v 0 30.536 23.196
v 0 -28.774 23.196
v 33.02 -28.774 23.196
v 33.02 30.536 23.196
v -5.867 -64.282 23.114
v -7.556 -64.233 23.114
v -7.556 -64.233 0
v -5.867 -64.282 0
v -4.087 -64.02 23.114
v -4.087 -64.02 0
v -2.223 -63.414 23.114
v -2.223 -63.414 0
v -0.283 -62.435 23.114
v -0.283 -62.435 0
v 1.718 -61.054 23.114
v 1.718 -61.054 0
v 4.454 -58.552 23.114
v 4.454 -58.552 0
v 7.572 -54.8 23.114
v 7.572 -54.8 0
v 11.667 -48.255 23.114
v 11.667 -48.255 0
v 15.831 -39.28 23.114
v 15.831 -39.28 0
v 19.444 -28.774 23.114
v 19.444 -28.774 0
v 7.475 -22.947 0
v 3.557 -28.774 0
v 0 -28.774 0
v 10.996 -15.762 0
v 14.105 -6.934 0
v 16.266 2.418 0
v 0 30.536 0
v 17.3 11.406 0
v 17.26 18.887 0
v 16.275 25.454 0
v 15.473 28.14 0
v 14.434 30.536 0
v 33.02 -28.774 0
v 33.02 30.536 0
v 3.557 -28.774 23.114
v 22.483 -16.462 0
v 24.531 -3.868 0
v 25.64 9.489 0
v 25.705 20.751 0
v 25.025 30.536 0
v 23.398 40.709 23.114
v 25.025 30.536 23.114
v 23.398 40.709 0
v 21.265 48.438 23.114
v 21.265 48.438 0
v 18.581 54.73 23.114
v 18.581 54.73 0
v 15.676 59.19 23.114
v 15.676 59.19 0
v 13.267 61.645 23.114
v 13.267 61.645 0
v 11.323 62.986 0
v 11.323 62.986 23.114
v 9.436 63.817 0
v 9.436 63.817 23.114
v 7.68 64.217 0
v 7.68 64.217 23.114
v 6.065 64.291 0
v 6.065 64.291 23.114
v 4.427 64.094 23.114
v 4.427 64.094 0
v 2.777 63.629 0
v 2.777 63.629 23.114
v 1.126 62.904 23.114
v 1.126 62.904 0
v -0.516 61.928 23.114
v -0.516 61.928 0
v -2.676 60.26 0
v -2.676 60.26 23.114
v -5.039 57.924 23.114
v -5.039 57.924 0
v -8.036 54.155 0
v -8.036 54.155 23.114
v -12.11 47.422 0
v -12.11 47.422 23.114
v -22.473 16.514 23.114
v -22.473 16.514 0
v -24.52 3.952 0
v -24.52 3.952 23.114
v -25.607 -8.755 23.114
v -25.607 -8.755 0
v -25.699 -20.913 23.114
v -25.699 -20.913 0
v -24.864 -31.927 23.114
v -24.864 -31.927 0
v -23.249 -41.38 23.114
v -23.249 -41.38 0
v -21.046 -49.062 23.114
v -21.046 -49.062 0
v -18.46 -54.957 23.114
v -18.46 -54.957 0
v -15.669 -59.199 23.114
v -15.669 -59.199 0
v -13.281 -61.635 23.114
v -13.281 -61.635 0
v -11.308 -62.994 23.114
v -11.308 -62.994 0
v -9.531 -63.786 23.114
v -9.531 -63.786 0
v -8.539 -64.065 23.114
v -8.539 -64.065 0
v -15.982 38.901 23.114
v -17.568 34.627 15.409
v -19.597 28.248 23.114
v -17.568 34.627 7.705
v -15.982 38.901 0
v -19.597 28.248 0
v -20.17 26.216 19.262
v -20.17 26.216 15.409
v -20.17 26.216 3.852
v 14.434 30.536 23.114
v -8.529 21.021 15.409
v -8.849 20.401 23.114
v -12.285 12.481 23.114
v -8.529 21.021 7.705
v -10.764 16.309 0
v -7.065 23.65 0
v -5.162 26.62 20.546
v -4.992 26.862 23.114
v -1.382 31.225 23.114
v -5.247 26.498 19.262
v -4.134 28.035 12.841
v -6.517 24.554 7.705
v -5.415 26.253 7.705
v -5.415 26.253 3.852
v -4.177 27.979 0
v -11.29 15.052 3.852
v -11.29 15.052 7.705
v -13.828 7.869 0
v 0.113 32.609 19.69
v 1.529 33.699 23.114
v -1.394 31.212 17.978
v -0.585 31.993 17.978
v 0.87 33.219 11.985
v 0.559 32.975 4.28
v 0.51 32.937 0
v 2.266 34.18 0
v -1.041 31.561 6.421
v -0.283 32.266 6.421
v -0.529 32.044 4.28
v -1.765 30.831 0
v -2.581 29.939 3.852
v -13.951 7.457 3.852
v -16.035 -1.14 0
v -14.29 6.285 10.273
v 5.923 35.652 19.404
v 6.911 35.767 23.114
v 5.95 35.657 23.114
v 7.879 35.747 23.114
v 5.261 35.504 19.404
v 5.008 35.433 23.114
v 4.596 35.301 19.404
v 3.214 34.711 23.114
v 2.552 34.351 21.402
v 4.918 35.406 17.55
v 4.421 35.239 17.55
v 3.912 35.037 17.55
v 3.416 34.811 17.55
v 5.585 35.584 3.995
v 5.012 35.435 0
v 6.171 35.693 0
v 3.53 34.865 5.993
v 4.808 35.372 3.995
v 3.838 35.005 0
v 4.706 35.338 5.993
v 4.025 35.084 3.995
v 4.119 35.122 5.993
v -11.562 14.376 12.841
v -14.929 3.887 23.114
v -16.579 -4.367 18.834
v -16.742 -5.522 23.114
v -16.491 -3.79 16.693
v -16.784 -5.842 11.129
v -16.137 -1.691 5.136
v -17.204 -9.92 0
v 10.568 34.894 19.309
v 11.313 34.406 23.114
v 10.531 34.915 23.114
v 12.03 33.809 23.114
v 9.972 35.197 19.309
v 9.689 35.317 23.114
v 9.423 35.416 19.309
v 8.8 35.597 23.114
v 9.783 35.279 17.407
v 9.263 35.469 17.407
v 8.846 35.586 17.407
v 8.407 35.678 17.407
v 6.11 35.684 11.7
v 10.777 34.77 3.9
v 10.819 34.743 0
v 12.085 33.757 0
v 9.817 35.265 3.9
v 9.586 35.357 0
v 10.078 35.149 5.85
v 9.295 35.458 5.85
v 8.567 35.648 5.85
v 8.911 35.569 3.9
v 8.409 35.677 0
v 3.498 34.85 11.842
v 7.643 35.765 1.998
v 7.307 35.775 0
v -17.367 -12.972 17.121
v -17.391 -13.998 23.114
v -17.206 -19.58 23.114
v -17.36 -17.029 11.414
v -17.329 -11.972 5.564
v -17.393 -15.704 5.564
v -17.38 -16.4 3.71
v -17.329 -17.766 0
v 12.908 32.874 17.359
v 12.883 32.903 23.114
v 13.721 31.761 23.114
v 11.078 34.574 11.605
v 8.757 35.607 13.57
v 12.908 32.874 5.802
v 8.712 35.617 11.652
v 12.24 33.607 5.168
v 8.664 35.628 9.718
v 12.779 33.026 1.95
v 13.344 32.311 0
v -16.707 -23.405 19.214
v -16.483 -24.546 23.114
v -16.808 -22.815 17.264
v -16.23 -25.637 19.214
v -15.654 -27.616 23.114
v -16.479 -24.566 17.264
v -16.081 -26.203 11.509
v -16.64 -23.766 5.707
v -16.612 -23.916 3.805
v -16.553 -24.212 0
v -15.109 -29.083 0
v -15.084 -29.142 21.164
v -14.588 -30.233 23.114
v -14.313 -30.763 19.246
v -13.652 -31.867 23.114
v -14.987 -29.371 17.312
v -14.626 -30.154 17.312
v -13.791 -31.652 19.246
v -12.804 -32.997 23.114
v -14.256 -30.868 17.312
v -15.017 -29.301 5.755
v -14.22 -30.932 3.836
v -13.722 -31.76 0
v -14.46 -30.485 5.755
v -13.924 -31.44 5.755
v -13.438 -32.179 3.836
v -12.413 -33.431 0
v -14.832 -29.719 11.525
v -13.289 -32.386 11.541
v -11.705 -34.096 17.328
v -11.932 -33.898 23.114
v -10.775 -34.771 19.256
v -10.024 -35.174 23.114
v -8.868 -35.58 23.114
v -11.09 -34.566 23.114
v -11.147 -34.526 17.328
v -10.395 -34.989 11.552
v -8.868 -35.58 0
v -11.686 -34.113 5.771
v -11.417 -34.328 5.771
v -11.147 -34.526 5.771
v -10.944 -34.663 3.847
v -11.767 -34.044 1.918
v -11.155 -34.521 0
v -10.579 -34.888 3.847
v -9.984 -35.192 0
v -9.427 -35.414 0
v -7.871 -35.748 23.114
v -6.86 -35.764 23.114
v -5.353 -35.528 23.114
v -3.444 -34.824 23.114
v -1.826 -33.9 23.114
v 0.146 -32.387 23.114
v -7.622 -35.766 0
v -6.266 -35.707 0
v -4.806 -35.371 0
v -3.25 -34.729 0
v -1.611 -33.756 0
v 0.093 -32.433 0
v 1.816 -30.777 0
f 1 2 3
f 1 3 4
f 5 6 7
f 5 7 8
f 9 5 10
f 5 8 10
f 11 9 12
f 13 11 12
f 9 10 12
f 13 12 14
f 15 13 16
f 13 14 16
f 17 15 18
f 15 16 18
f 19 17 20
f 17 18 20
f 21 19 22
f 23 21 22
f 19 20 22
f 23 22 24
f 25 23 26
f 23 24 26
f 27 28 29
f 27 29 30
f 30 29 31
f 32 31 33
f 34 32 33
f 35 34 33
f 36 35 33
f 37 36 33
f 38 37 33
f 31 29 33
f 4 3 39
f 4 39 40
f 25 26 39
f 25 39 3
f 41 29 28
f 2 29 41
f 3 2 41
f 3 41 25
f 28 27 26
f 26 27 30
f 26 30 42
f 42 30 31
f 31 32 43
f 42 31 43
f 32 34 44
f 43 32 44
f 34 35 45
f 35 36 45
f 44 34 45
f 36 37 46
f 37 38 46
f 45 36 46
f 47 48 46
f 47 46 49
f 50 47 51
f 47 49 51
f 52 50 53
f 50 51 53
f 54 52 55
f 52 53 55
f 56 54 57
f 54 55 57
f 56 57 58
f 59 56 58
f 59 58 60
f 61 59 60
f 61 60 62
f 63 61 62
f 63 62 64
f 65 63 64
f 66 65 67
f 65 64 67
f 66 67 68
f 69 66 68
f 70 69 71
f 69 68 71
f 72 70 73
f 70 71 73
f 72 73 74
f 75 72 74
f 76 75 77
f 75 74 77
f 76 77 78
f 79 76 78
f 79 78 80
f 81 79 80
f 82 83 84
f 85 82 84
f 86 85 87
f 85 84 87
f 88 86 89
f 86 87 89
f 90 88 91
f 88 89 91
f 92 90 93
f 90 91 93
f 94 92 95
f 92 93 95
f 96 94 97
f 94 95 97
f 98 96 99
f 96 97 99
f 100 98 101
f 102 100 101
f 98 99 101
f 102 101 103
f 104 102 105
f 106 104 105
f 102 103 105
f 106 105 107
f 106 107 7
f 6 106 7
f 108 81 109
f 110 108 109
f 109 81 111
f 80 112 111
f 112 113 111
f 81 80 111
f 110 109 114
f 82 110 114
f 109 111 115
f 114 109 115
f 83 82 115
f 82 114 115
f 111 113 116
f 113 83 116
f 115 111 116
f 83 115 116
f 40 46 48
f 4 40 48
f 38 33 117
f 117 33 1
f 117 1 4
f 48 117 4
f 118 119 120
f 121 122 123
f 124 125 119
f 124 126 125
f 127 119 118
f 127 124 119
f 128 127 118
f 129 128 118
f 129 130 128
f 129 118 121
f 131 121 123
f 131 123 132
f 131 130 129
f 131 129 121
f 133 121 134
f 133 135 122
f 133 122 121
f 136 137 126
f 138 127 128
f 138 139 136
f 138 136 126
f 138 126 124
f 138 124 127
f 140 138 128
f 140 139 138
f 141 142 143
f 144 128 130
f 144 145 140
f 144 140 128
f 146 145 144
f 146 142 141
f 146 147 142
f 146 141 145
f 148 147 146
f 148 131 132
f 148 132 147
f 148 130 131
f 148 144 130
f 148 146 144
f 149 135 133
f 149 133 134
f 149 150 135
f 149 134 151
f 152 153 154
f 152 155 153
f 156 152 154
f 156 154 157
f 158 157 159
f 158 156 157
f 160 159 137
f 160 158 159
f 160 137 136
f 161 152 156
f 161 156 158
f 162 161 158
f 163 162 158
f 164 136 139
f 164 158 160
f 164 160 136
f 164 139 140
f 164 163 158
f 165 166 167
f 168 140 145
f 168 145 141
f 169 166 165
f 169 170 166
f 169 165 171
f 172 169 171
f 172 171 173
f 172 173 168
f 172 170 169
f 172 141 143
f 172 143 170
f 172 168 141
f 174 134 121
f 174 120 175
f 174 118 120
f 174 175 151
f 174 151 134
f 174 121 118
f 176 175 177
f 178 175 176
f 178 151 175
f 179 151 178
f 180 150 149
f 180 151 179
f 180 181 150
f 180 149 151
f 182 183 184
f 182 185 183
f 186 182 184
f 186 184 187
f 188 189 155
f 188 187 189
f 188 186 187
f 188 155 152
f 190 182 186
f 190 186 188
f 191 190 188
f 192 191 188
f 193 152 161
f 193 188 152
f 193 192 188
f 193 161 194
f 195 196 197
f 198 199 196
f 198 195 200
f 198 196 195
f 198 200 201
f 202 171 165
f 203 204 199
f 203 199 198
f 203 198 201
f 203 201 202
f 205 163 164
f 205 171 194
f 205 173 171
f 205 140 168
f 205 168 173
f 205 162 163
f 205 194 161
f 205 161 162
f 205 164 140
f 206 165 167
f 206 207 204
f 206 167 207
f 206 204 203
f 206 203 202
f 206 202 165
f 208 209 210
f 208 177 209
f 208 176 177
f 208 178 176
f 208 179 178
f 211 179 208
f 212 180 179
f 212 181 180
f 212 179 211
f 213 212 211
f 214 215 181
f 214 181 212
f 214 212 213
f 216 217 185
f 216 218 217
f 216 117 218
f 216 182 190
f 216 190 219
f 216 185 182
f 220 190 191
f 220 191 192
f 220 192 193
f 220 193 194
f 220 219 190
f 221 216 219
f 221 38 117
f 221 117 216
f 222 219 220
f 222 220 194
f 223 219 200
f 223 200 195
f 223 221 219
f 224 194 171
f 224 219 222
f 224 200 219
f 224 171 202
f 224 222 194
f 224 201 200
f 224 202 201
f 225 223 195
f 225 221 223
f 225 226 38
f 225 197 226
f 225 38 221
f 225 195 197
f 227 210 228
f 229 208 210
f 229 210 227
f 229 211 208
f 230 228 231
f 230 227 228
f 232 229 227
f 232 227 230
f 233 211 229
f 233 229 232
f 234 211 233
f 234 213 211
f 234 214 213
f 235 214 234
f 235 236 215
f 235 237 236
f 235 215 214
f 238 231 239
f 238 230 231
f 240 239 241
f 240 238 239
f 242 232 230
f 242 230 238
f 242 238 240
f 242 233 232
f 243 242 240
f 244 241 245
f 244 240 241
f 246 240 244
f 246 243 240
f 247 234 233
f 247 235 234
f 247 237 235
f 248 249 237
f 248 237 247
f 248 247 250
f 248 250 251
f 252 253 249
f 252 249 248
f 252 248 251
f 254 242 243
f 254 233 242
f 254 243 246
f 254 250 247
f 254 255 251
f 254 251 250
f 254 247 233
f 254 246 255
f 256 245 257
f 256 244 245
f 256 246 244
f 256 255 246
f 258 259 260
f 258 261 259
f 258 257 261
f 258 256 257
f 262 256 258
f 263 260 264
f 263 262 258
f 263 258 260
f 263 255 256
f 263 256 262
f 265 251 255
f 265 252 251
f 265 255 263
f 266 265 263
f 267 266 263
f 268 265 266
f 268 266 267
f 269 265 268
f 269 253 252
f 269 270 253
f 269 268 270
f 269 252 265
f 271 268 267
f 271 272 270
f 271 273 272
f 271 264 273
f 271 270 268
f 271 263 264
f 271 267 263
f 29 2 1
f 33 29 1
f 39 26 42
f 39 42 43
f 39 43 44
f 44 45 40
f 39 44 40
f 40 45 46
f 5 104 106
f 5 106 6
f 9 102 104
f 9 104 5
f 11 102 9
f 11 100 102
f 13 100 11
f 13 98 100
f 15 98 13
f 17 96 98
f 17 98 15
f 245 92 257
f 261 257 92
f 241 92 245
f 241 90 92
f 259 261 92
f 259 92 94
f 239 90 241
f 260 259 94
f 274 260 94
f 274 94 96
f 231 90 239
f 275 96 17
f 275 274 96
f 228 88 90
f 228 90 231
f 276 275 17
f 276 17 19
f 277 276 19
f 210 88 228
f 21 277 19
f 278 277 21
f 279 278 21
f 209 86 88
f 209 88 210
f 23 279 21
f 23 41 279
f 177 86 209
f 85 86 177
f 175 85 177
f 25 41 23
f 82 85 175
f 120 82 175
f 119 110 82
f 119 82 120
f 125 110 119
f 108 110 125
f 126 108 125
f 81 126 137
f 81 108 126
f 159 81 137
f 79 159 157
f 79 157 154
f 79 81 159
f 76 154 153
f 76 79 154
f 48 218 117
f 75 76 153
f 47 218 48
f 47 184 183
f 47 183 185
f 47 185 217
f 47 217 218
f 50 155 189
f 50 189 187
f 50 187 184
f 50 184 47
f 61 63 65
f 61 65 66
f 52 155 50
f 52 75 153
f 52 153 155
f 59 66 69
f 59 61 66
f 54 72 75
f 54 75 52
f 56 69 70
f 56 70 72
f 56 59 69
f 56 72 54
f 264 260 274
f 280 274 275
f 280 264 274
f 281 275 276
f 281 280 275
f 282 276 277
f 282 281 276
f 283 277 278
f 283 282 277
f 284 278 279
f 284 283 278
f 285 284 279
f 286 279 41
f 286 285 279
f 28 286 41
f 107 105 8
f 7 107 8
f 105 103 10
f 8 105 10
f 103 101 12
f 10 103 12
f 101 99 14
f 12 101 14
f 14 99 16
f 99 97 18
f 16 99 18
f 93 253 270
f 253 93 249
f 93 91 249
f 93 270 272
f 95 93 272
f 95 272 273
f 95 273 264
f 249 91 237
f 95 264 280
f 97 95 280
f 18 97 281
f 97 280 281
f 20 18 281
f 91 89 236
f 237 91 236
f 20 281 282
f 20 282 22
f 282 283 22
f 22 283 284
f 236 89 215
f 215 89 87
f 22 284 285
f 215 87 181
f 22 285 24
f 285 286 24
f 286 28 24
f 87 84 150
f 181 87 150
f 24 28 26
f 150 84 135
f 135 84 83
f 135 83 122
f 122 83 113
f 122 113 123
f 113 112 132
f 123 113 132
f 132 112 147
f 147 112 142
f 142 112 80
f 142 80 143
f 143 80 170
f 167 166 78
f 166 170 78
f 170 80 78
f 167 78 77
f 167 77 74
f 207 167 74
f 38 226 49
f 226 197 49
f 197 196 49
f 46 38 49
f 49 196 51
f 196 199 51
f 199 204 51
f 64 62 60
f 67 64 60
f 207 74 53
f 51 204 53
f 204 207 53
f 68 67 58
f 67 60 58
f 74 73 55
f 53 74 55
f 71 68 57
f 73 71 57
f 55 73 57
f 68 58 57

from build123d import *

# Parameters (mm, degrees)
F1_DEPTH = 23.114
F3_DEPTH = 60.452
F4_W     = 59.3101680279
F4_H     = 23.1955610216
F5_DEPTH = 33.02


with BuildPart() as f1:
    # F0 (on Top) → F1 (new body)
    with BuildSketch(Plane.XY):
        with BuildLine():
            add(Edge.make_bspline(
                [(-7.5555481017, -64.2328634858), (35.1351228345, -69.2544583556), (25.1231095189, 29.605634308), (15.1110962033, 128.4657269716), (-17.5675614173, 34.6272291778), (-50.2462190379, -59.211268616), (-7.5555481017, -64.2328634858)],
                knots=[0, 0, 0, 2.0943951024, 2.0943951024, 4.1887902048, 4.1887902048, 6.2831853072, 6.2831853072, 6.2831853072], degree=2, weights=[1, 0.5, 1, 0.5, 1, 0.5, 1]))
        make_face()
    extrude(amount=F1_DEPTH)

    # F2 (on Top) → F3 (cut)
    with BuildSketch(Plane.XY):
        with BuildLine():
            add(Edge.make_bspline(
                [(-8.8678235188, -35.5803593993), (17.0578542718, -42.0419111974), (17.3967506547, 14.5594038006), (17.7356470376, 71.1607187986), (-8.5289271359, 21.0209555987), (-34.7935013094, -29.1188076012), (-8.8678235188, -35.5803593993)],
                knots=[0, 0, 0, 2.0943951024, 2.0943951024, 4.1887902048, 4.1887902048, 6.2831853072, 6.2831853072, 6.2831853072], degree=2, weights=[1, 0.5, 1, 0.5, 1, 0.5, 1]))
        make_face()
    extrude(amount=F3_DEPTH, mode=Mode.SUBTRACT)

    # F4 (on Right) → F5 (join)
    with BuildSketch(Plane.YZ):
        with Locations((0.8808430284, 11.5977805108)):
            Rectangle(F4_W, F4_H)
    extrude(amount=F5_DEPTH)


solid = f1.part
